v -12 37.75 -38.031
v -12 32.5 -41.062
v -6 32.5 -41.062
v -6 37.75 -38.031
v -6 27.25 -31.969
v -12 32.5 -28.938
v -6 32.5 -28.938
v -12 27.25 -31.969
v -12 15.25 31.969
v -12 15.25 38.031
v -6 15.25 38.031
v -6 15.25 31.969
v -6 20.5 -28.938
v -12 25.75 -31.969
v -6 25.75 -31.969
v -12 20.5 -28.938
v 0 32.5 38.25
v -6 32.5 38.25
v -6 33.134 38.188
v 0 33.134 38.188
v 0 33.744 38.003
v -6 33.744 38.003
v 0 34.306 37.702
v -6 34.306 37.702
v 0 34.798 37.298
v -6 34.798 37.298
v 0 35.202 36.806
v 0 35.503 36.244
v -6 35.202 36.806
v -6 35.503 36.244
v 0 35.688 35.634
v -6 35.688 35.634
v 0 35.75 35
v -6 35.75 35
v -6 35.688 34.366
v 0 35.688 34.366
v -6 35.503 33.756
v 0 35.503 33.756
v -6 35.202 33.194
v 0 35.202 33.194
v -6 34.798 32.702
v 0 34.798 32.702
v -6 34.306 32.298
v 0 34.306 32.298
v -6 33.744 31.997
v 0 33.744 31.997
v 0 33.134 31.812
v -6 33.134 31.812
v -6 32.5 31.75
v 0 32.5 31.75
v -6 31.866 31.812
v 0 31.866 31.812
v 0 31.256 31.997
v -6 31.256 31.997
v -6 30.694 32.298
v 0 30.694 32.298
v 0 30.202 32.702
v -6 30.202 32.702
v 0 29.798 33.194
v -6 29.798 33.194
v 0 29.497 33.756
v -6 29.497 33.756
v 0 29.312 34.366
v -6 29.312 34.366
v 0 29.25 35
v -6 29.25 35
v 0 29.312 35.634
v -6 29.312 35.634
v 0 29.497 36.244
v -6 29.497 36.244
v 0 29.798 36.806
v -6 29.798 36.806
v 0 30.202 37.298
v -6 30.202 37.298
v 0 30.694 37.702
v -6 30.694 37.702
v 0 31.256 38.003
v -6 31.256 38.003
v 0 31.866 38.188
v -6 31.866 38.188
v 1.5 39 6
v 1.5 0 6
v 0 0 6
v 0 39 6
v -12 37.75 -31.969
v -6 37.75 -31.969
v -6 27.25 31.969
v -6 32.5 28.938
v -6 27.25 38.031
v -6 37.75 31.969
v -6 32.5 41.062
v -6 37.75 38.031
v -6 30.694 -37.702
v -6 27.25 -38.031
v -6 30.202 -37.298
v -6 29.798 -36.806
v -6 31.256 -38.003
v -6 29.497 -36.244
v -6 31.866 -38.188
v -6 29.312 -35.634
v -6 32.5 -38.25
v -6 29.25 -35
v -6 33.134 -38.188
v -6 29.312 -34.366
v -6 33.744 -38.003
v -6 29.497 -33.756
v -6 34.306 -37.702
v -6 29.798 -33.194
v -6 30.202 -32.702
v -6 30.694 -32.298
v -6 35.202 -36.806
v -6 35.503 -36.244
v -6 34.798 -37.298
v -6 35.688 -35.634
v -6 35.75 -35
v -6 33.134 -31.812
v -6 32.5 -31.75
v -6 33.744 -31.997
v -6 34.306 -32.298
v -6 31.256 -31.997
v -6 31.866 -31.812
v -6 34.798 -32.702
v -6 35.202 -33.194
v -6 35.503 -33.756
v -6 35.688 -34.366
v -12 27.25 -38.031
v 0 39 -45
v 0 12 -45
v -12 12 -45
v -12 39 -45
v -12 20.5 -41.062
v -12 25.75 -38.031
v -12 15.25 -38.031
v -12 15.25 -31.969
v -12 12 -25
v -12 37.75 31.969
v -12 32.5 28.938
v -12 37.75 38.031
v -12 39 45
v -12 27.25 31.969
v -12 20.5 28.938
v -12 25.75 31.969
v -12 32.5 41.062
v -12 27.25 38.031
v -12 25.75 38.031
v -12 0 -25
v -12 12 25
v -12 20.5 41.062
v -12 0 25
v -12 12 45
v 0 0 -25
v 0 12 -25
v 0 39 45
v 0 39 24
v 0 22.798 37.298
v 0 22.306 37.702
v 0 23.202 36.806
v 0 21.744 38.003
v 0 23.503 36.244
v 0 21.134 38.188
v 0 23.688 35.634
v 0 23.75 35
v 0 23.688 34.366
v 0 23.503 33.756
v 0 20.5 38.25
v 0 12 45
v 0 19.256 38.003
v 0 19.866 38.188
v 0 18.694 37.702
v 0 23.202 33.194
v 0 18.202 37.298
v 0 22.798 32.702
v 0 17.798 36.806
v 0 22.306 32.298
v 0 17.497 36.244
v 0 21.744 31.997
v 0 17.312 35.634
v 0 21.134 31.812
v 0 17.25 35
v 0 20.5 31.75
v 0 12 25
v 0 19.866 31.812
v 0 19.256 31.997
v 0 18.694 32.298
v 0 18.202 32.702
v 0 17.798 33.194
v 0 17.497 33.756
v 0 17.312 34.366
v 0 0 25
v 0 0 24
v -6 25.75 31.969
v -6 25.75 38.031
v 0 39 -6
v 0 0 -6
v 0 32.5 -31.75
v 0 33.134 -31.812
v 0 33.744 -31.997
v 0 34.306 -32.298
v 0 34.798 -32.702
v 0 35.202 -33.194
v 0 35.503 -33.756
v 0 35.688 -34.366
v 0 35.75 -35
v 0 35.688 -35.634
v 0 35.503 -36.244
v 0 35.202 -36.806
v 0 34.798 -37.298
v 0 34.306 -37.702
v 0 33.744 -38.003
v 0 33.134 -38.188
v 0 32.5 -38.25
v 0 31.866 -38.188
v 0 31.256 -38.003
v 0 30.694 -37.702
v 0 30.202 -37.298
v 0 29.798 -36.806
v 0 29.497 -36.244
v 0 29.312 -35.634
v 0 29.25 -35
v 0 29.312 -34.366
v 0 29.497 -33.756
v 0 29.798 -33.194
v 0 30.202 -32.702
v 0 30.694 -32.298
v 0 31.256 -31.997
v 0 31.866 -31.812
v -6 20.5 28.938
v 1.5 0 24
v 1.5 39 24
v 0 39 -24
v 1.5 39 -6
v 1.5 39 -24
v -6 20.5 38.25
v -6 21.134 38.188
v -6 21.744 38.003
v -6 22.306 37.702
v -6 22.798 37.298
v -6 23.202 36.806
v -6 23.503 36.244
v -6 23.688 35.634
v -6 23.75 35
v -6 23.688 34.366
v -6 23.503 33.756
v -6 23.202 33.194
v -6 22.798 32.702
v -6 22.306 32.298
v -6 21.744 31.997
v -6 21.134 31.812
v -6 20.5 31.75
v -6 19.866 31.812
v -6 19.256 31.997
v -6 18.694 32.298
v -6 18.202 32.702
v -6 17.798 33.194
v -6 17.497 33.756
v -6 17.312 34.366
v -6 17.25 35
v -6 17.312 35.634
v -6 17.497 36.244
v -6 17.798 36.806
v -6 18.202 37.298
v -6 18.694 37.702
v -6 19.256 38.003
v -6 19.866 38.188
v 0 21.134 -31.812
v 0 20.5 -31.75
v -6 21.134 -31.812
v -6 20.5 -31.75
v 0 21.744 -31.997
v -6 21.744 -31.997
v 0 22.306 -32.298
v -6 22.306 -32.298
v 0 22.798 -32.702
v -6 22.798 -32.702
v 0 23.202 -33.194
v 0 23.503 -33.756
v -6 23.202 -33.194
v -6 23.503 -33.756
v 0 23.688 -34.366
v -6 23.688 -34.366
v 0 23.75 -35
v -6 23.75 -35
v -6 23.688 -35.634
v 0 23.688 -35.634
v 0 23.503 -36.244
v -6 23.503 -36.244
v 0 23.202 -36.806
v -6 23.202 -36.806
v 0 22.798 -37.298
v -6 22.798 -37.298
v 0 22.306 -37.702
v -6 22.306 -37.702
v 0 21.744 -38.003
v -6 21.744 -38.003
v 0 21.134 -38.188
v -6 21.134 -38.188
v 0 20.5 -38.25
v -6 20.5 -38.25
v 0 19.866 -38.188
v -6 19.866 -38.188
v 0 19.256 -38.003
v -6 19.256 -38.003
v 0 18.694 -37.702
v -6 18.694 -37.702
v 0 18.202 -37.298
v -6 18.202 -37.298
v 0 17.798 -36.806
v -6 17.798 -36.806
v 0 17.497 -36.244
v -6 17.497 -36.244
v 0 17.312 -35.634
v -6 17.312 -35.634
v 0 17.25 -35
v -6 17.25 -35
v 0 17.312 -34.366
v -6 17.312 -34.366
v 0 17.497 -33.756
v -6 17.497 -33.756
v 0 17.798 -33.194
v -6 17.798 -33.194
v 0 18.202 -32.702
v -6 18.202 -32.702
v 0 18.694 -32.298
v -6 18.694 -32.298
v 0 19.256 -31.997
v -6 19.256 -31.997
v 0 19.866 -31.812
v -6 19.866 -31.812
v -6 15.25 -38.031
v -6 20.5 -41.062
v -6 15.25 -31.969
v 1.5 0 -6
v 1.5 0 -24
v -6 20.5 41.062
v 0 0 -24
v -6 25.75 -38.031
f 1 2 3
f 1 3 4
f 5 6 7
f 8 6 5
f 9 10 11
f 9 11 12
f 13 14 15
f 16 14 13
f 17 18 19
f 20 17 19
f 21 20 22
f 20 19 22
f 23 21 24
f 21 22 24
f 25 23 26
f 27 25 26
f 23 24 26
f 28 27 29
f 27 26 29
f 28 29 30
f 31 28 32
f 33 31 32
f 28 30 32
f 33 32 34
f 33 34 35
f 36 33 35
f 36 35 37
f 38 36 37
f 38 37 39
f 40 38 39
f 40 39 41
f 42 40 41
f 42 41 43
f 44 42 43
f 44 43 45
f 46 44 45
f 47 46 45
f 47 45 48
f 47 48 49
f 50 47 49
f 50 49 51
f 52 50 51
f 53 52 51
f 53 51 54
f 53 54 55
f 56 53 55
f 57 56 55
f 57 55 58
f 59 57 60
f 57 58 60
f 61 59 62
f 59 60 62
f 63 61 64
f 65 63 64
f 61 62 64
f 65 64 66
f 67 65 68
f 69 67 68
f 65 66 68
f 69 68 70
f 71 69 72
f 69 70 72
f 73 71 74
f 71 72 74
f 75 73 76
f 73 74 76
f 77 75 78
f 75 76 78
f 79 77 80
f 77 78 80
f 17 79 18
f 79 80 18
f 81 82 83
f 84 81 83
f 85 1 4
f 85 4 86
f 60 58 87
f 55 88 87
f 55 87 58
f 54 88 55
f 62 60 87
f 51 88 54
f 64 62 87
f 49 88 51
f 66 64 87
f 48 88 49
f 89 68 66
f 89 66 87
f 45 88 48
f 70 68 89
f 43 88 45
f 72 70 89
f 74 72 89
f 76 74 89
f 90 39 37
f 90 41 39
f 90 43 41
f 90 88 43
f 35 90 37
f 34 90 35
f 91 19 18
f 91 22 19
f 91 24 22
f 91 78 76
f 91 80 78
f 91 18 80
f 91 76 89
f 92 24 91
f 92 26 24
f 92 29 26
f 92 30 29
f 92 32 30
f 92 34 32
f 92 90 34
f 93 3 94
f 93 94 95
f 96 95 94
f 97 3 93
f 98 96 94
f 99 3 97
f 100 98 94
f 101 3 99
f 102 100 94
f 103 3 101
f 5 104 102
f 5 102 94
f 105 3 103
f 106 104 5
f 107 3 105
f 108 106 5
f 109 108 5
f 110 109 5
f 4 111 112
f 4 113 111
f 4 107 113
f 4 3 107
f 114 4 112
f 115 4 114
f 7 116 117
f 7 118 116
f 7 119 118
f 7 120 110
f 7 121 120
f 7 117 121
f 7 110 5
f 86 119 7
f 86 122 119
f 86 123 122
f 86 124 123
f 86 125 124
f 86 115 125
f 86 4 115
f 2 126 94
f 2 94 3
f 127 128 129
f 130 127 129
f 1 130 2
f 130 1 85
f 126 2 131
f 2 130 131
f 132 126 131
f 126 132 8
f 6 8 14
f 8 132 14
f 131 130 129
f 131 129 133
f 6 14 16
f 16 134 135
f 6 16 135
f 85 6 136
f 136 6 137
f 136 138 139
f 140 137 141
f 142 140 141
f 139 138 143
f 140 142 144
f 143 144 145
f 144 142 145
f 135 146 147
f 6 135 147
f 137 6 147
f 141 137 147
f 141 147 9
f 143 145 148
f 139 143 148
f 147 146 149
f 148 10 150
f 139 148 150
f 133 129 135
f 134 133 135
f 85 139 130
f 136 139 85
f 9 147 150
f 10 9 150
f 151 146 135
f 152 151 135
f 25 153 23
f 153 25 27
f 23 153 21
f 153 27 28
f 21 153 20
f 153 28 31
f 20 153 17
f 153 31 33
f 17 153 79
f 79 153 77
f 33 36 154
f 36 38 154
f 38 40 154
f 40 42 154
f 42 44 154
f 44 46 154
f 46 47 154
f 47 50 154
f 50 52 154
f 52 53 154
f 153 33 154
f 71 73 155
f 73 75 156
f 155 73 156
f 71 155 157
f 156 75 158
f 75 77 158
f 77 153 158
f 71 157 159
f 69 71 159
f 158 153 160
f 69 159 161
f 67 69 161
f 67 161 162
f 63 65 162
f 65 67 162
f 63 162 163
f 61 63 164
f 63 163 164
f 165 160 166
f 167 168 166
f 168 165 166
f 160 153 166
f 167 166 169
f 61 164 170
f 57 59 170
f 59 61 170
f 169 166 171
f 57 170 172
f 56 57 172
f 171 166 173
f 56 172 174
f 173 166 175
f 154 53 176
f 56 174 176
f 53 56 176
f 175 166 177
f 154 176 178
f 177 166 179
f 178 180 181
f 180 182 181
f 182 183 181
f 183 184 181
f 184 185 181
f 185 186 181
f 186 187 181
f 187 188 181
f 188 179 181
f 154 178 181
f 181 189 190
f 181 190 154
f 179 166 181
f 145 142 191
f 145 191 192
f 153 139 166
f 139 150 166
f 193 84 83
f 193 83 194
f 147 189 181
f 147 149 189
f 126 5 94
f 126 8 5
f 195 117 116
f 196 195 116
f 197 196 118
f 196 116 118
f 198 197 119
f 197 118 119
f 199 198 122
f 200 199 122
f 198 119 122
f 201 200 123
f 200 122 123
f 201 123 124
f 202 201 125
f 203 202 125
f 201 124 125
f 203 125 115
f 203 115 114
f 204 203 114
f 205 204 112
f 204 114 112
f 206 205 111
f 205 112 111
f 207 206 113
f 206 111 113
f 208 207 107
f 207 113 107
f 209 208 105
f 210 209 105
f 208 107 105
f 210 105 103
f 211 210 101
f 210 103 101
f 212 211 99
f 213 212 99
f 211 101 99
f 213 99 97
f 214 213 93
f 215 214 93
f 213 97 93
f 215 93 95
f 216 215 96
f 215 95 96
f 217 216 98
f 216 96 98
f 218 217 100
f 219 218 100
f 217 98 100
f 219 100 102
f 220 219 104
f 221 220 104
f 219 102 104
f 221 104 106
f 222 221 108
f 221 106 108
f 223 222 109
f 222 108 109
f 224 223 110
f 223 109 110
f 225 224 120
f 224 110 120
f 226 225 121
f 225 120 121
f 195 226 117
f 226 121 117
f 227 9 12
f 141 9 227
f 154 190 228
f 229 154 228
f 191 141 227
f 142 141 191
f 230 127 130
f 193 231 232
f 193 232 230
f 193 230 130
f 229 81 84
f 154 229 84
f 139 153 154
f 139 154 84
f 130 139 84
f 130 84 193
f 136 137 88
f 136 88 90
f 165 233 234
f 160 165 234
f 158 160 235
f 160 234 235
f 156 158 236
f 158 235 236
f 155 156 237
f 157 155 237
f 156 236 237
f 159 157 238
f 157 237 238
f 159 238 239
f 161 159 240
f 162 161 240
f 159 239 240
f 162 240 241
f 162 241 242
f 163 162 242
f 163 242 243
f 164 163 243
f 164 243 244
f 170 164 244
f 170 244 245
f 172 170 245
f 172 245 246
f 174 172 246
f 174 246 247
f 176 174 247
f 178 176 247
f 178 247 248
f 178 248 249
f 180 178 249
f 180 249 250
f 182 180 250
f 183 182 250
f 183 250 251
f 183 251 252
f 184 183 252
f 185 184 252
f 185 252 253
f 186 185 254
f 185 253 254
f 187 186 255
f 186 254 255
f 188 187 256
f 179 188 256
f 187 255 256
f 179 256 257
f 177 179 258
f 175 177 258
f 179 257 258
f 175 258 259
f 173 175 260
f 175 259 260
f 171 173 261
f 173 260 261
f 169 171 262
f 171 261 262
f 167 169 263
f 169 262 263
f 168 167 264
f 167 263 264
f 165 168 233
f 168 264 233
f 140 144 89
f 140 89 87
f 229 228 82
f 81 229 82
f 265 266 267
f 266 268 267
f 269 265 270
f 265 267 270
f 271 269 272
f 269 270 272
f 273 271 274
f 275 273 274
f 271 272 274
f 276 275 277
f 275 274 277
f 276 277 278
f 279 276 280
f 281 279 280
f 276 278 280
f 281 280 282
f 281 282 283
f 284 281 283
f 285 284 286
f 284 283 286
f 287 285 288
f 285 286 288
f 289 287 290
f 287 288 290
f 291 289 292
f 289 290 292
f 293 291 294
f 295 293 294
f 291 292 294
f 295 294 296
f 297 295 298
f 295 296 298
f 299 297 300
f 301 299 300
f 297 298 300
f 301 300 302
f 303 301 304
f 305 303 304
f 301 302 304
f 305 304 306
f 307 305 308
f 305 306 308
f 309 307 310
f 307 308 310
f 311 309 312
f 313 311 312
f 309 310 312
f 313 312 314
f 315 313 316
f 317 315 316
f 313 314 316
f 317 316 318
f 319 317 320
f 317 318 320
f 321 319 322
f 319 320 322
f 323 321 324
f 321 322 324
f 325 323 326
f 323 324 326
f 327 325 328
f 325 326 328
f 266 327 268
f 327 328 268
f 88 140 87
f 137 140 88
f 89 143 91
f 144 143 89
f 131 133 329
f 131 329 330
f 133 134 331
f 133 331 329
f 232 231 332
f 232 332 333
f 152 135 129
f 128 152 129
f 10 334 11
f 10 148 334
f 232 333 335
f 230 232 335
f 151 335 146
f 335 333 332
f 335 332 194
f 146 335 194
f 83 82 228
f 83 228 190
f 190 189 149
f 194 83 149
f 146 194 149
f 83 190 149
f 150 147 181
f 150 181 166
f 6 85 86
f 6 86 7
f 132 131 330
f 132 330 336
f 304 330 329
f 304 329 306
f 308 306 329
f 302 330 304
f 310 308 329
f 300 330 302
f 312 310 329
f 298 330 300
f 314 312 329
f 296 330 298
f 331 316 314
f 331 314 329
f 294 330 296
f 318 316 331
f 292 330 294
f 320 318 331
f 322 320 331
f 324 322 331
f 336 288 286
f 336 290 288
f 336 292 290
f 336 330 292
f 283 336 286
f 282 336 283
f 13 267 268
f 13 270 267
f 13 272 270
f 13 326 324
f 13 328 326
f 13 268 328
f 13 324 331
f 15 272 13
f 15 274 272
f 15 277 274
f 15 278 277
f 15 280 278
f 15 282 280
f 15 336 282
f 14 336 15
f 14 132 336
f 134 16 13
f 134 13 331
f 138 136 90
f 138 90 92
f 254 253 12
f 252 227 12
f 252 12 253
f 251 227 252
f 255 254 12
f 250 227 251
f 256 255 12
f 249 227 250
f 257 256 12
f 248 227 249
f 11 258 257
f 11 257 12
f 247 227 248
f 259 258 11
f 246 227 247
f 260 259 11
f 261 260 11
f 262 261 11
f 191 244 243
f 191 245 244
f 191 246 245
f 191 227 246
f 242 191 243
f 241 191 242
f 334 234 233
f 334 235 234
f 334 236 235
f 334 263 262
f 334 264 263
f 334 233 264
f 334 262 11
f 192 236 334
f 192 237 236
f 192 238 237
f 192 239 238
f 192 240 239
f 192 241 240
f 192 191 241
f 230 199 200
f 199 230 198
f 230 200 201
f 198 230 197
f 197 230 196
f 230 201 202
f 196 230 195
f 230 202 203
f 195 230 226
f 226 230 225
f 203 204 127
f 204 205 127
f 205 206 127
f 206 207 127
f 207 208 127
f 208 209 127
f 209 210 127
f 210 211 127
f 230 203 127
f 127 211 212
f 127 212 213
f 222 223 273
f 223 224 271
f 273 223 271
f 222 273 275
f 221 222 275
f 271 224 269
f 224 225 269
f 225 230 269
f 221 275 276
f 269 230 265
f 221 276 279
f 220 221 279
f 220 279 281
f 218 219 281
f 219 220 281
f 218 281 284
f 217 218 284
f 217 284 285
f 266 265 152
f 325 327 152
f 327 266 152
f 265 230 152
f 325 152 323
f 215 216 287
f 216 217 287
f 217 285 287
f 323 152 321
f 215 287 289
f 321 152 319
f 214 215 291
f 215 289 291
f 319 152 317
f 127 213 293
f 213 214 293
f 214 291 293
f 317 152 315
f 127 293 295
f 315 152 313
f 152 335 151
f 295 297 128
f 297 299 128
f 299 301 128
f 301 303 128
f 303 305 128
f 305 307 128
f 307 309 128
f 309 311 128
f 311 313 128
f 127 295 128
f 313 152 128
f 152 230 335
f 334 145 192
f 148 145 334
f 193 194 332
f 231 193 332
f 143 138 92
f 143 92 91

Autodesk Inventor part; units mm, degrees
ref_plane "YZ Plane" through (0, 0, 0) normal (1, 0, 0) x (0, 1, 0)
ref_plane "XZ Plane" through (0, 0, 0) normal (0, 1, 0) x (-1, 0, 0)
ref_plane "XY Plane" through (0, 0, 0) normal (0, 0, 1) x (1, 0, 0)
sketch "Szkic1" plane through (0, 0, 0) normal (0, 1, 0) x (-1, 0, 0)
  line L0 (12, 45) -> (0, 45)
  line L1 (0, 45) -> (0, -45)
  line L2 (0, -45) -> (12, -45)
  line L3 (12, -45) -> (12, 45)
  line L4 (0, 24) -> (-1.5, 24)
  line L5 (-1.5, 24) -> (-1.5, 6)
  line L6 (-1.5, 6) -> (0, 6)
  line L7 (0, 6) -> (0, 24)
  line L8 (0, -6) -> (-1.5, -6)
  line L9 (-1.5, -6) -> (-1.5, -24)
  line L10 (-1.5, -24) -> (0, -24)
  line L11 (0, -24) -> (0, -6)
  point P0 (0, 0)
  point P1 (0, -24)
  point P2 (0, 6)
  dimension "d0" = 90
  dimension "d1" = 12
  dimension "d2" = 45
  dimension "d3" = 21
  dimension "d4" = 18
  dimension "d5" = 1.5
  dimension "d6" = 21
  dimension "d7" = 18
extrude "Wyciągnięcie proste1" add sketch "Szkic1" along normal blind 39
sketch "Szkic2" plane through (-12, 0, -45) normal (-1, 0, 0) x (0, 0, 1)
  circle A0 centre (10, 32.5) radius 3.25
  circle A1 centre (10, 20.5) radius 3.25
  circle A2 centre (80, 32.5) radius 3.25
  circle A3 centre (80, 20.5) radius 3.25
  line L0 (0, 39) -> (90, 39) projected
  line L1 (0, 0) -> (0, 39) projected
  line L2 (90, 0) -> (90, 39) projected
  line L3 (0, 0) -> (20, 0)
  line L4 (20, 0) -> (20, 12)
  line L5 (20, 12) -> (0, 12)
  line L6 (0, 12) -> (0, 0)
  line L7 (0, 0) -> (90, 0) projected
  line L8 (90, 0) -> (70, 0)
  line L9 (70, 0) -> (70, 12)
  line L10 (70, 12) -> (90, 12)
  line L11 (90, 12) -> (90, 0)
  line L12 (13.0311, 37.75) -> (16.0622, 32.5)
  line L13 (16.0622, 32.5) -> (13.0311, 27.25)
  line L14 (13.0311, 27.25) -> (6.9689, 27.25)
  line L15 (6.9689, 27.25) -> (3.9378, 32.5)
  line L16 (3.9378, 32.5) -> (6.9689, 37.75)
  line L17 (6.9689, 37.75) -> (13.0311, 37.75)
  line L18 (13.0311, 25.75) -> (16.0622, 20.5)
  line L19 (16.0622, 20.5) -> (13.0311, 15.25)
  line L20 (13.0311, 15.25) -> (6.9689, 15.25)
  line L21 (6.9689, 15.25) -> (3.9378, 20.5)
  line L22 (3.9378, 20.5) -> (6.9689, 25.75)
  line L23 (6.9689, 25.75) -> (13.0311, 25.75)
  line L24 (76.9689, 25.75) -> (83.0311, 25.75)
  line L25 (83.0311, 25.75) -> (86.0622, 20.5)
  line L26 (86.0622, 20.5) -> (83.0311, 15.25)
  line L27 (83.0311, 15.25) -> (76.9689, 15.25)
  line L28 (76.9689, 15.25) -> (73.9378, 20.5)
  line L29 (73.9378, 20.5) -> (76.9689, 25.75)
  line L30 (76.9689, 37.75) -> (83.0311, 37.75)
  line L31 (83.0311, 37.75) -> (86.0622, 32.5)
  line L32 (86.0622, 32.5) -> (83.0311, 27.25)
  line L33 (83.0311, 27.25) -> (76.9689, 27.25)
  line L34 (76.9689, 27.25) -> (73.9378, 32.5)
  line L35 (73.9378, 32.5) -> (76.9689, 37.75)
  point P0 (45, 0)
  point P1 (0, 12)
  dimension "d10" = 6.5
  dimension "d11" = 6.5
  dimension "d12" = 10
  dimension "d13" = 12
  dimension "d14" = 10
  dimension "d15" = 20
  dimension "d16" = 12
  dimension "d17" = 20
  dimension "d18" = 10.5
  dimension "d19" = 10.5
  dimension "d20" = 10.5
  dimension "d21" = 10.5
extrude "Wyciągnięcie proste2" cut sketch "Szkic2" against normal through all contours A0 | A1 | A2 | A3 | L5 L4 L3 L1 | L2 L7 L9 L10
extrude "Wyciągnięcie proste3" cut sketch "Szkic2" against normal blind 6 contours A0 | A1 | A2 | A3 | L12 L13 L14 L15 L16 L17 | L18 L19 L20 L21 L22 L23 | L24 L25 L26 L27 L28 L29 | L30 L31 L32 L33 L34 L35
equation "\"d14\" = d12"
equation "\"d19\" = d18"
equation "\"d20\" = d18"
equation "\"d21\" = d18"
properties part number "YCarriageBackHolder" material "Tworzywo sztuczne ABS"
